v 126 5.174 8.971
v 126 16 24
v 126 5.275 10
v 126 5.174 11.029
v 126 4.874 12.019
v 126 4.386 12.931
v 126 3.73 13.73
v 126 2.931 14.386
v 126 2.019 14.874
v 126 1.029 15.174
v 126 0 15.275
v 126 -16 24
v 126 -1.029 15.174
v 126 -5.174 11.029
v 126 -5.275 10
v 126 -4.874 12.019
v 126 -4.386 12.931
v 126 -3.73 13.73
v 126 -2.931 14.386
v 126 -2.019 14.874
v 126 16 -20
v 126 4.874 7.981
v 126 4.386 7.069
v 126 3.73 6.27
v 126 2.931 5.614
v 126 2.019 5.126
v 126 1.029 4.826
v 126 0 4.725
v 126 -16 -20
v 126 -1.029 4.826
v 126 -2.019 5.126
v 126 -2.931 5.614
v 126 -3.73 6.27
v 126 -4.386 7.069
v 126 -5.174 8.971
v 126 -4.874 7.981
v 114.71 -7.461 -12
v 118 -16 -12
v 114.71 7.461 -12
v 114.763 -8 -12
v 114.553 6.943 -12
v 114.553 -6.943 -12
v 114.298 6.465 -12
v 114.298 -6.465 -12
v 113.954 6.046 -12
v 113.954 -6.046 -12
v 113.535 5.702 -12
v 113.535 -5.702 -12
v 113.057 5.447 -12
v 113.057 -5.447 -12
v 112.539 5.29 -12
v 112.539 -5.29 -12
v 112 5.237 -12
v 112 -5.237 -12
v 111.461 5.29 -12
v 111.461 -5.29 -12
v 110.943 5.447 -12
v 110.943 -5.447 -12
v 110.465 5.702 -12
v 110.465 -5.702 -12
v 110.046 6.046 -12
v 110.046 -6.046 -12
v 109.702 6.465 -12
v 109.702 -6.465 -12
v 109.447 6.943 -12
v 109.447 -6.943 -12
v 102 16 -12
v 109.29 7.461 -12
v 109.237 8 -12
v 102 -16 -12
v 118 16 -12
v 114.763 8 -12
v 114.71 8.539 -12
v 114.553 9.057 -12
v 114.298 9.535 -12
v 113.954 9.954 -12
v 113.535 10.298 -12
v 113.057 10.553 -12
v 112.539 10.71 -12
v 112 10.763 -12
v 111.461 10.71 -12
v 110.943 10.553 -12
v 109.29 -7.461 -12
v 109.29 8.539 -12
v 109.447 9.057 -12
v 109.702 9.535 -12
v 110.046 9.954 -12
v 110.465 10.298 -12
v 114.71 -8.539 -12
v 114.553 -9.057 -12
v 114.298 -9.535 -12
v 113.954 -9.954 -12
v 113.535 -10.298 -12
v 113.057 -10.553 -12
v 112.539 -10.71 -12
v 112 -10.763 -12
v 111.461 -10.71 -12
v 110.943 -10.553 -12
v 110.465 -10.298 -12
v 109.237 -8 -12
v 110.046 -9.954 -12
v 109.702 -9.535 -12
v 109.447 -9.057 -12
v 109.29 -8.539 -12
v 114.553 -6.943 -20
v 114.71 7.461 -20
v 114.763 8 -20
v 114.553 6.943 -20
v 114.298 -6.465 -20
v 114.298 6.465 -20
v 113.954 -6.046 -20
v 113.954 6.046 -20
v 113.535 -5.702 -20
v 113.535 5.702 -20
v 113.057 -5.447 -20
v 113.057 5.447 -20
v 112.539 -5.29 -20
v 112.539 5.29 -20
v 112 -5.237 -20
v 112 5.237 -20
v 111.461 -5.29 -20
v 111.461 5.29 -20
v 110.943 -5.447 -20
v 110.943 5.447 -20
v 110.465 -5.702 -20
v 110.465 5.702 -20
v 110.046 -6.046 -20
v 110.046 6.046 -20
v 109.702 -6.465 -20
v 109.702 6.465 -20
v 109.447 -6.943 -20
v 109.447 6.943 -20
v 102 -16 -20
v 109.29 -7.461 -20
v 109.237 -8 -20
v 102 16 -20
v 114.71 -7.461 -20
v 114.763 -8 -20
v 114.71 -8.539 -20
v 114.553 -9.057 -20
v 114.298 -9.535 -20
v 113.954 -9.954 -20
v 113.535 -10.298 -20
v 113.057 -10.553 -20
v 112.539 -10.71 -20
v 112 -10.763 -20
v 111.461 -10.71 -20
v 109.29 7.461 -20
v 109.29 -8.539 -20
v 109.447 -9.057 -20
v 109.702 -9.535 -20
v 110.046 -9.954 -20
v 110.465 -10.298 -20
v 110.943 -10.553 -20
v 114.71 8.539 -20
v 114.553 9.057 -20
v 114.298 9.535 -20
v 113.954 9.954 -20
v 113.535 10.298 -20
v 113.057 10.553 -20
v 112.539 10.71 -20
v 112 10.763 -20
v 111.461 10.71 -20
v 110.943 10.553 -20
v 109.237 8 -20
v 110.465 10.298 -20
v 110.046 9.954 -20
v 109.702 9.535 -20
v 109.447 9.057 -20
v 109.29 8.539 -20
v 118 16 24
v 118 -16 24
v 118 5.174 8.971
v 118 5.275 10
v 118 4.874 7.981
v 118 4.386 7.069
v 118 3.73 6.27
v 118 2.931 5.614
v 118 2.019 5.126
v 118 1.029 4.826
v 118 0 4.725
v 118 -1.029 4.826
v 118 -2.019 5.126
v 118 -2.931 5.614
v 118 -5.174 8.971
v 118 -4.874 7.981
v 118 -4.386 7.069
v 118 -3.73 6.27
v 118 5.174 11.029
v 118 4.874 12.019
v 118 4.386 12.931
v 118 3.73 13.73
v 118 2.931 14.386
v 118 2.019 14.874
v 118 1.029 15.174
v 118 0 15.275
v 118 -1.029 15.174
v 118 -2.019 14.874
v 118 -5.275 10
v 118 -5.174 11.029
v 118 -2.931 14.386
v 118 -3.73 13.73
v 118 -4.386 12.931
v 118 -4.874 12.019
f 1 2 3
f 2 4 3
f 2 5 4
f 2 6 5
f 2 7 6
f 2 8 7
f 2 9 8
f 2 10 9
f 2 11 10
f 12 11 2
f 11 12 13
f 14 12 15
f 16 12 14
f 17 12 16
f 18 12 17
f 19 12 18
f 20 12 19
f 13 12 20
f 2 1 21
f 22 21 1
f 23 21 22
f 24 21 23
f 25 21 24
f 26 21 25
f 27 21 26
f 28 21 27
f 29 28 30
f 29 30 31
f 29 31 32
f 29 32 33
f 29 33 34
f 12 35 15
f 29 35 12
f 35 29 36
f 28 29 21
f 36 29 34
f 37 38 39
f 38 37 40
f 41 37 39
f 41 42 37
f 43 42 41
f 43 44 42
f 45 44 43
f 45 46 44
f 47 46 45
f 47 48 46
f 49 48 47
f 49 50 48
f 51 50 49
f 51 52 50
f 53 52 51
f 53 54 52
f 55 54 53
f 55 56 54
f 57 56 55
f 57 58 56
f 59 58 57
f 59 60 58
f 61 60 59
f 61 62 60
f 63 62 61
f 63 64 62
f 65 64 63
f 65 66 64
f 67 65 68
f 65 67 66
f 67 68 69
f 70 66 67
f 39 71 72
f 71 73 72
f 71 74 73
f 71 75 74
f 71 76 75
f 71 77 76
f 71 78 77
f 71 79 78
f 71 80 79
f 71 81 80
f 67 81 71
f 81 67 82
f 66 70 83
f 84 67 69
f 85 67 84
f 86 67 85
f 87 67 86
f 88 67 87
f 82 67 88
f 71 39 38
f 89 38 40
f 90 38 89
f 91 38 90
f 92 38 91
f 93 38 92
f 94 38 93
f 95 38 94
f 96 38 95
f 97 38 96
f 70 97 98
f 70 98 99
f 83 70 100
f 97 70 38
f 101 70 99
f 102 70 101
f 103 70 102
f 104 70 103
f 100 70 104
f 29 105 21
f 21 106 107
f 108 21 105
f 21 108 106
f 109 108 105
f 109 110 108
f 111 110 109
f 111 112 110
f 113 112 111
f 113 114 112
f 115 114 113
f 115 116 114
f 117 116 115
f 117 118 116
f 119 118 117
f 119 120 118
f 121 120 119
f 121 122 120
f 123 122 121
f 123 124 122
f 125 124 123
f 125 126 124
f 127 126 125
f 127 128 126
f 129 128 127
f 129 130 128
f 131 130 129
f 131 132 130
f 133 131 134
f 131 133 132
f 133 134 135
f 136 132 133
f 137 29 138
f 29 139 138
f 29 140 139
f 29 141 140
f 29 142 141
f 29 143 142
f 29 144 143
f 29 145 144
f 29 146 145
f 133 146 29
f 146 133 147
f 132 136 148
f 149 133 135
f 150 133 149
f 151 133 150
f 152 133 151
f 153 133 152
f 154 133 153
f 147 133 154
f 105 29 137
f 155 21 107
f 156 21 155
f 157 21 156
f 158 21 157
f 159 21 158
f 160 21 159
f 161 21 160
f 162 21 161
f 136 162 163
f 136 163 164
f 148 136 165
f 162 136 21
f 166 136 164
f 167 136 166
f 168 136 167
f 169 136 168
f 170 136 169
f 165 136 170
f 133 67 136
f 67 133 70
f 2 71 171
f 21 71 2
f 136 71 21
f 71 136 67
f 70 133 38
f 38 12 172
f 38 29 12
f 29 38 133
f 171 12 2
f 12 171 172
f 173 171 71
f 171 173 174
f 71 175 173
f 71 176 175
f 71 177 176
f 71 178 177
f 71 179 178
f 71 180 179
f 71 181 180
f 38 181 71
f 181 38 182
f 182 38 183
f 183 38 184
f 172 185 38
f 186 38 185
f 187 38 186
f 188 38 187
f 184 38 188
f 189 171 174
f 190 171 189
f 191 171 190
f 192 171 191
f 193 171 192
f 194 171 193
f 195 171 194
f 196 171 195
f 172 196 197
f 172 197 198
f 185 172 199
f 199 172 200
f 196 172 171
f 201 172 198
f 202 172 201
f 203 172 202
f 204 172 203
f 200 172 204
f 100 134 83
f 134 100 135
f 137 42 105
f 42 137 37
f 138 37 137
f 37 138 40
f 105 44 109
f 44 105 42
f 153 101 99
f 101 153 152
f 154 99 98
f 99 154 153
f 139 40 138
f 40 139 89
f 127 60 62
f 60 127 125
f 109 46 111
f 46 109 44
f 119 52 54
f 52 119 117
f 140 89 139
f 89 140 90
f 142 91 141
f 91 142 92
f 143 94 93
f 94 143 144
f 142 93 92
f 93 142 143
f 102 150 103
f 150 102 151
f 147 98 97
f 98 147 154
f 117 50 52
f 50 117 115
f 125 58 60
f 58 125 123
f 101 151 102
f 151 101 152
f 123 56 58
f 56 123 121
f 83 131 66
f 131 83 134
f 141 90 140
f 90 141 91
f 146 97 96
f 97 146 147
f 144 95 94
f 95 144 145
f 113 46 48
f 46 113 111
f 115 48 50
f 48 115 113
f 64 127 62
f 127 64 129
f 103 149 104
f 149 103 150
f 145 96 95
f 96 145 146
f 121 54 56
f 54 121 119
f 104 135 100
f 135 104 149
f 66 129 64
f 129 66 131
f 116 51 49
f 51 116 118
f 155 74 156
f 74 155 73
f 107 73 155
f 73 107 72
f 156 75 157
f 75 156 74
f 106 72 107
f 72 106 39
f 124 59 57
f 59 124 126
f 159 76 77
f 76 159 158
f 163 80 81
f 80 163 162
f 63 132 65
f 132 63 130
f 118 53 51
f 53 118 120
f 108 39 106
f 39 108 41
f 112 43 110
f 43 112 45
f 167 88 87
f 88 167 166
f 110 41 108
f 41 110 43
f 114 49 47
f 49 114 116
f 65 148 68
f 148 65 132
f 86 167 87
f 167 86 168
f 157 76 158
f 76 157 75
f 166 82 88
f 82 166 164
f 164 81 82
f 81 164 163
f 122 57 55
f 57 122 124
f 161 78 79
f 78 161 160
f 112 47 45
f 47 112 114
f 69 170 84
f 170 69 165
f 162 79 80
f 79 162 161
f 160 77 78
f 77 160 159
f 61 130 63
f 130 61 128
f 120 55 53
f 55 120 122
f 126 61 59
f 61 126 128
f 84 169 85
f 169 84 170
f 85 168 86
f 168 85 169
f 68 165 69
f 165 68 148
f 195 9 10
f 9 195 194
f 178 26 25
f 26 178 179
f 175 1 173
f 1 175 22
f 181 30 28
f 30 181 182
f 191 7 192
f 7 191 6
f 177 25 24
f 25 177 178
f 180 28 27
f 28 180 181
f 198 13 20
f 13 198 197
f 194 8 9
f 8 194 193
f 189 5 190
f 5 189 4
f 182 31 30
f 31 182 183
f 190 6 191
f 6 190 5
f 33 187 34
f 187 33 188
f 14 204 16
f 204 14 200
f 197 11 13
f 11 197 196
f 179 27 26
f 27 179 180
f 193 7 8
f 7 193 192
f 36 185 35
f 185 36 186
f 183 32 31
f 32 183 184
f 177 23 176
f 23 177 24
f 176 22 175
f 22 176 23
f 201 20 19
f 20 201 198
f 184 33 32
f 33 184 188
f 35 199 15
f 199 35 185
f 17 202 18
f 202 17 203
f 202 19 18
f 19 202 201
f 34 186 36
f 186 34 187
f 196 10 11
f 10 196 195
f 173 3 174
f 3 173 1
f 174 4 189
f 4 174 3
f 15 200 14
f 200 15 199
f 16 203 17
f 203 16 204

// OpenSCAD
// Float attachment lug. Four copies; mirror X for the left side.
// Assembly coordinates for right side, Y=0. mm.
/* [Bracket] */
deck_edge=118;
deck_t=12;
foot_inset=16;
wall_t=8;
foot_t=8;
width=32;
top_z=24;
/* [Float attachment] */
float_hole=10.5; // M10 clearance hole, not a printed thread
float_z=10;
/* [Two M5 deck bolts] */
bolt_x=112;
bolt_pitch=16;
bolt_d=5.5;
/* [Hidden] */
$fn=48;
eps=0.02;
module hole(d,h){cylinder(d=d/cos(180/32),h=h,$fn=32);}
assert(width/2-float_hole/2>=8);
assert(top_z-float_z-float_hole/2>=8);
assert(deck_edge-bolt_x-bolt_d/2>=3);
assert(width/2-bolt_pitch/2-bolt_d/2>=5);
difference(){
 union(){
  translate([deck_edge-foot_inset,-width/2,-deck_t-foot_t])cube([foot_inset+wall_t,width,foot_t]);
  translate([deck_edge,-width/2,-deck_t-foot_t])cube([wall_t,width,top_z+deck_t+foot_t]);
 }
 translate([deck_edge-eps,0,float_z])rotate([0,90,0])hole(float_hole,wall_t+2*eps);
 for(y=[-bolt_pitch/2,bolt_pitch/2])translate([bolt_x,y,-deck_t-foot_t-eps])hole(bolt_d,foot_t+2*eps);
}
